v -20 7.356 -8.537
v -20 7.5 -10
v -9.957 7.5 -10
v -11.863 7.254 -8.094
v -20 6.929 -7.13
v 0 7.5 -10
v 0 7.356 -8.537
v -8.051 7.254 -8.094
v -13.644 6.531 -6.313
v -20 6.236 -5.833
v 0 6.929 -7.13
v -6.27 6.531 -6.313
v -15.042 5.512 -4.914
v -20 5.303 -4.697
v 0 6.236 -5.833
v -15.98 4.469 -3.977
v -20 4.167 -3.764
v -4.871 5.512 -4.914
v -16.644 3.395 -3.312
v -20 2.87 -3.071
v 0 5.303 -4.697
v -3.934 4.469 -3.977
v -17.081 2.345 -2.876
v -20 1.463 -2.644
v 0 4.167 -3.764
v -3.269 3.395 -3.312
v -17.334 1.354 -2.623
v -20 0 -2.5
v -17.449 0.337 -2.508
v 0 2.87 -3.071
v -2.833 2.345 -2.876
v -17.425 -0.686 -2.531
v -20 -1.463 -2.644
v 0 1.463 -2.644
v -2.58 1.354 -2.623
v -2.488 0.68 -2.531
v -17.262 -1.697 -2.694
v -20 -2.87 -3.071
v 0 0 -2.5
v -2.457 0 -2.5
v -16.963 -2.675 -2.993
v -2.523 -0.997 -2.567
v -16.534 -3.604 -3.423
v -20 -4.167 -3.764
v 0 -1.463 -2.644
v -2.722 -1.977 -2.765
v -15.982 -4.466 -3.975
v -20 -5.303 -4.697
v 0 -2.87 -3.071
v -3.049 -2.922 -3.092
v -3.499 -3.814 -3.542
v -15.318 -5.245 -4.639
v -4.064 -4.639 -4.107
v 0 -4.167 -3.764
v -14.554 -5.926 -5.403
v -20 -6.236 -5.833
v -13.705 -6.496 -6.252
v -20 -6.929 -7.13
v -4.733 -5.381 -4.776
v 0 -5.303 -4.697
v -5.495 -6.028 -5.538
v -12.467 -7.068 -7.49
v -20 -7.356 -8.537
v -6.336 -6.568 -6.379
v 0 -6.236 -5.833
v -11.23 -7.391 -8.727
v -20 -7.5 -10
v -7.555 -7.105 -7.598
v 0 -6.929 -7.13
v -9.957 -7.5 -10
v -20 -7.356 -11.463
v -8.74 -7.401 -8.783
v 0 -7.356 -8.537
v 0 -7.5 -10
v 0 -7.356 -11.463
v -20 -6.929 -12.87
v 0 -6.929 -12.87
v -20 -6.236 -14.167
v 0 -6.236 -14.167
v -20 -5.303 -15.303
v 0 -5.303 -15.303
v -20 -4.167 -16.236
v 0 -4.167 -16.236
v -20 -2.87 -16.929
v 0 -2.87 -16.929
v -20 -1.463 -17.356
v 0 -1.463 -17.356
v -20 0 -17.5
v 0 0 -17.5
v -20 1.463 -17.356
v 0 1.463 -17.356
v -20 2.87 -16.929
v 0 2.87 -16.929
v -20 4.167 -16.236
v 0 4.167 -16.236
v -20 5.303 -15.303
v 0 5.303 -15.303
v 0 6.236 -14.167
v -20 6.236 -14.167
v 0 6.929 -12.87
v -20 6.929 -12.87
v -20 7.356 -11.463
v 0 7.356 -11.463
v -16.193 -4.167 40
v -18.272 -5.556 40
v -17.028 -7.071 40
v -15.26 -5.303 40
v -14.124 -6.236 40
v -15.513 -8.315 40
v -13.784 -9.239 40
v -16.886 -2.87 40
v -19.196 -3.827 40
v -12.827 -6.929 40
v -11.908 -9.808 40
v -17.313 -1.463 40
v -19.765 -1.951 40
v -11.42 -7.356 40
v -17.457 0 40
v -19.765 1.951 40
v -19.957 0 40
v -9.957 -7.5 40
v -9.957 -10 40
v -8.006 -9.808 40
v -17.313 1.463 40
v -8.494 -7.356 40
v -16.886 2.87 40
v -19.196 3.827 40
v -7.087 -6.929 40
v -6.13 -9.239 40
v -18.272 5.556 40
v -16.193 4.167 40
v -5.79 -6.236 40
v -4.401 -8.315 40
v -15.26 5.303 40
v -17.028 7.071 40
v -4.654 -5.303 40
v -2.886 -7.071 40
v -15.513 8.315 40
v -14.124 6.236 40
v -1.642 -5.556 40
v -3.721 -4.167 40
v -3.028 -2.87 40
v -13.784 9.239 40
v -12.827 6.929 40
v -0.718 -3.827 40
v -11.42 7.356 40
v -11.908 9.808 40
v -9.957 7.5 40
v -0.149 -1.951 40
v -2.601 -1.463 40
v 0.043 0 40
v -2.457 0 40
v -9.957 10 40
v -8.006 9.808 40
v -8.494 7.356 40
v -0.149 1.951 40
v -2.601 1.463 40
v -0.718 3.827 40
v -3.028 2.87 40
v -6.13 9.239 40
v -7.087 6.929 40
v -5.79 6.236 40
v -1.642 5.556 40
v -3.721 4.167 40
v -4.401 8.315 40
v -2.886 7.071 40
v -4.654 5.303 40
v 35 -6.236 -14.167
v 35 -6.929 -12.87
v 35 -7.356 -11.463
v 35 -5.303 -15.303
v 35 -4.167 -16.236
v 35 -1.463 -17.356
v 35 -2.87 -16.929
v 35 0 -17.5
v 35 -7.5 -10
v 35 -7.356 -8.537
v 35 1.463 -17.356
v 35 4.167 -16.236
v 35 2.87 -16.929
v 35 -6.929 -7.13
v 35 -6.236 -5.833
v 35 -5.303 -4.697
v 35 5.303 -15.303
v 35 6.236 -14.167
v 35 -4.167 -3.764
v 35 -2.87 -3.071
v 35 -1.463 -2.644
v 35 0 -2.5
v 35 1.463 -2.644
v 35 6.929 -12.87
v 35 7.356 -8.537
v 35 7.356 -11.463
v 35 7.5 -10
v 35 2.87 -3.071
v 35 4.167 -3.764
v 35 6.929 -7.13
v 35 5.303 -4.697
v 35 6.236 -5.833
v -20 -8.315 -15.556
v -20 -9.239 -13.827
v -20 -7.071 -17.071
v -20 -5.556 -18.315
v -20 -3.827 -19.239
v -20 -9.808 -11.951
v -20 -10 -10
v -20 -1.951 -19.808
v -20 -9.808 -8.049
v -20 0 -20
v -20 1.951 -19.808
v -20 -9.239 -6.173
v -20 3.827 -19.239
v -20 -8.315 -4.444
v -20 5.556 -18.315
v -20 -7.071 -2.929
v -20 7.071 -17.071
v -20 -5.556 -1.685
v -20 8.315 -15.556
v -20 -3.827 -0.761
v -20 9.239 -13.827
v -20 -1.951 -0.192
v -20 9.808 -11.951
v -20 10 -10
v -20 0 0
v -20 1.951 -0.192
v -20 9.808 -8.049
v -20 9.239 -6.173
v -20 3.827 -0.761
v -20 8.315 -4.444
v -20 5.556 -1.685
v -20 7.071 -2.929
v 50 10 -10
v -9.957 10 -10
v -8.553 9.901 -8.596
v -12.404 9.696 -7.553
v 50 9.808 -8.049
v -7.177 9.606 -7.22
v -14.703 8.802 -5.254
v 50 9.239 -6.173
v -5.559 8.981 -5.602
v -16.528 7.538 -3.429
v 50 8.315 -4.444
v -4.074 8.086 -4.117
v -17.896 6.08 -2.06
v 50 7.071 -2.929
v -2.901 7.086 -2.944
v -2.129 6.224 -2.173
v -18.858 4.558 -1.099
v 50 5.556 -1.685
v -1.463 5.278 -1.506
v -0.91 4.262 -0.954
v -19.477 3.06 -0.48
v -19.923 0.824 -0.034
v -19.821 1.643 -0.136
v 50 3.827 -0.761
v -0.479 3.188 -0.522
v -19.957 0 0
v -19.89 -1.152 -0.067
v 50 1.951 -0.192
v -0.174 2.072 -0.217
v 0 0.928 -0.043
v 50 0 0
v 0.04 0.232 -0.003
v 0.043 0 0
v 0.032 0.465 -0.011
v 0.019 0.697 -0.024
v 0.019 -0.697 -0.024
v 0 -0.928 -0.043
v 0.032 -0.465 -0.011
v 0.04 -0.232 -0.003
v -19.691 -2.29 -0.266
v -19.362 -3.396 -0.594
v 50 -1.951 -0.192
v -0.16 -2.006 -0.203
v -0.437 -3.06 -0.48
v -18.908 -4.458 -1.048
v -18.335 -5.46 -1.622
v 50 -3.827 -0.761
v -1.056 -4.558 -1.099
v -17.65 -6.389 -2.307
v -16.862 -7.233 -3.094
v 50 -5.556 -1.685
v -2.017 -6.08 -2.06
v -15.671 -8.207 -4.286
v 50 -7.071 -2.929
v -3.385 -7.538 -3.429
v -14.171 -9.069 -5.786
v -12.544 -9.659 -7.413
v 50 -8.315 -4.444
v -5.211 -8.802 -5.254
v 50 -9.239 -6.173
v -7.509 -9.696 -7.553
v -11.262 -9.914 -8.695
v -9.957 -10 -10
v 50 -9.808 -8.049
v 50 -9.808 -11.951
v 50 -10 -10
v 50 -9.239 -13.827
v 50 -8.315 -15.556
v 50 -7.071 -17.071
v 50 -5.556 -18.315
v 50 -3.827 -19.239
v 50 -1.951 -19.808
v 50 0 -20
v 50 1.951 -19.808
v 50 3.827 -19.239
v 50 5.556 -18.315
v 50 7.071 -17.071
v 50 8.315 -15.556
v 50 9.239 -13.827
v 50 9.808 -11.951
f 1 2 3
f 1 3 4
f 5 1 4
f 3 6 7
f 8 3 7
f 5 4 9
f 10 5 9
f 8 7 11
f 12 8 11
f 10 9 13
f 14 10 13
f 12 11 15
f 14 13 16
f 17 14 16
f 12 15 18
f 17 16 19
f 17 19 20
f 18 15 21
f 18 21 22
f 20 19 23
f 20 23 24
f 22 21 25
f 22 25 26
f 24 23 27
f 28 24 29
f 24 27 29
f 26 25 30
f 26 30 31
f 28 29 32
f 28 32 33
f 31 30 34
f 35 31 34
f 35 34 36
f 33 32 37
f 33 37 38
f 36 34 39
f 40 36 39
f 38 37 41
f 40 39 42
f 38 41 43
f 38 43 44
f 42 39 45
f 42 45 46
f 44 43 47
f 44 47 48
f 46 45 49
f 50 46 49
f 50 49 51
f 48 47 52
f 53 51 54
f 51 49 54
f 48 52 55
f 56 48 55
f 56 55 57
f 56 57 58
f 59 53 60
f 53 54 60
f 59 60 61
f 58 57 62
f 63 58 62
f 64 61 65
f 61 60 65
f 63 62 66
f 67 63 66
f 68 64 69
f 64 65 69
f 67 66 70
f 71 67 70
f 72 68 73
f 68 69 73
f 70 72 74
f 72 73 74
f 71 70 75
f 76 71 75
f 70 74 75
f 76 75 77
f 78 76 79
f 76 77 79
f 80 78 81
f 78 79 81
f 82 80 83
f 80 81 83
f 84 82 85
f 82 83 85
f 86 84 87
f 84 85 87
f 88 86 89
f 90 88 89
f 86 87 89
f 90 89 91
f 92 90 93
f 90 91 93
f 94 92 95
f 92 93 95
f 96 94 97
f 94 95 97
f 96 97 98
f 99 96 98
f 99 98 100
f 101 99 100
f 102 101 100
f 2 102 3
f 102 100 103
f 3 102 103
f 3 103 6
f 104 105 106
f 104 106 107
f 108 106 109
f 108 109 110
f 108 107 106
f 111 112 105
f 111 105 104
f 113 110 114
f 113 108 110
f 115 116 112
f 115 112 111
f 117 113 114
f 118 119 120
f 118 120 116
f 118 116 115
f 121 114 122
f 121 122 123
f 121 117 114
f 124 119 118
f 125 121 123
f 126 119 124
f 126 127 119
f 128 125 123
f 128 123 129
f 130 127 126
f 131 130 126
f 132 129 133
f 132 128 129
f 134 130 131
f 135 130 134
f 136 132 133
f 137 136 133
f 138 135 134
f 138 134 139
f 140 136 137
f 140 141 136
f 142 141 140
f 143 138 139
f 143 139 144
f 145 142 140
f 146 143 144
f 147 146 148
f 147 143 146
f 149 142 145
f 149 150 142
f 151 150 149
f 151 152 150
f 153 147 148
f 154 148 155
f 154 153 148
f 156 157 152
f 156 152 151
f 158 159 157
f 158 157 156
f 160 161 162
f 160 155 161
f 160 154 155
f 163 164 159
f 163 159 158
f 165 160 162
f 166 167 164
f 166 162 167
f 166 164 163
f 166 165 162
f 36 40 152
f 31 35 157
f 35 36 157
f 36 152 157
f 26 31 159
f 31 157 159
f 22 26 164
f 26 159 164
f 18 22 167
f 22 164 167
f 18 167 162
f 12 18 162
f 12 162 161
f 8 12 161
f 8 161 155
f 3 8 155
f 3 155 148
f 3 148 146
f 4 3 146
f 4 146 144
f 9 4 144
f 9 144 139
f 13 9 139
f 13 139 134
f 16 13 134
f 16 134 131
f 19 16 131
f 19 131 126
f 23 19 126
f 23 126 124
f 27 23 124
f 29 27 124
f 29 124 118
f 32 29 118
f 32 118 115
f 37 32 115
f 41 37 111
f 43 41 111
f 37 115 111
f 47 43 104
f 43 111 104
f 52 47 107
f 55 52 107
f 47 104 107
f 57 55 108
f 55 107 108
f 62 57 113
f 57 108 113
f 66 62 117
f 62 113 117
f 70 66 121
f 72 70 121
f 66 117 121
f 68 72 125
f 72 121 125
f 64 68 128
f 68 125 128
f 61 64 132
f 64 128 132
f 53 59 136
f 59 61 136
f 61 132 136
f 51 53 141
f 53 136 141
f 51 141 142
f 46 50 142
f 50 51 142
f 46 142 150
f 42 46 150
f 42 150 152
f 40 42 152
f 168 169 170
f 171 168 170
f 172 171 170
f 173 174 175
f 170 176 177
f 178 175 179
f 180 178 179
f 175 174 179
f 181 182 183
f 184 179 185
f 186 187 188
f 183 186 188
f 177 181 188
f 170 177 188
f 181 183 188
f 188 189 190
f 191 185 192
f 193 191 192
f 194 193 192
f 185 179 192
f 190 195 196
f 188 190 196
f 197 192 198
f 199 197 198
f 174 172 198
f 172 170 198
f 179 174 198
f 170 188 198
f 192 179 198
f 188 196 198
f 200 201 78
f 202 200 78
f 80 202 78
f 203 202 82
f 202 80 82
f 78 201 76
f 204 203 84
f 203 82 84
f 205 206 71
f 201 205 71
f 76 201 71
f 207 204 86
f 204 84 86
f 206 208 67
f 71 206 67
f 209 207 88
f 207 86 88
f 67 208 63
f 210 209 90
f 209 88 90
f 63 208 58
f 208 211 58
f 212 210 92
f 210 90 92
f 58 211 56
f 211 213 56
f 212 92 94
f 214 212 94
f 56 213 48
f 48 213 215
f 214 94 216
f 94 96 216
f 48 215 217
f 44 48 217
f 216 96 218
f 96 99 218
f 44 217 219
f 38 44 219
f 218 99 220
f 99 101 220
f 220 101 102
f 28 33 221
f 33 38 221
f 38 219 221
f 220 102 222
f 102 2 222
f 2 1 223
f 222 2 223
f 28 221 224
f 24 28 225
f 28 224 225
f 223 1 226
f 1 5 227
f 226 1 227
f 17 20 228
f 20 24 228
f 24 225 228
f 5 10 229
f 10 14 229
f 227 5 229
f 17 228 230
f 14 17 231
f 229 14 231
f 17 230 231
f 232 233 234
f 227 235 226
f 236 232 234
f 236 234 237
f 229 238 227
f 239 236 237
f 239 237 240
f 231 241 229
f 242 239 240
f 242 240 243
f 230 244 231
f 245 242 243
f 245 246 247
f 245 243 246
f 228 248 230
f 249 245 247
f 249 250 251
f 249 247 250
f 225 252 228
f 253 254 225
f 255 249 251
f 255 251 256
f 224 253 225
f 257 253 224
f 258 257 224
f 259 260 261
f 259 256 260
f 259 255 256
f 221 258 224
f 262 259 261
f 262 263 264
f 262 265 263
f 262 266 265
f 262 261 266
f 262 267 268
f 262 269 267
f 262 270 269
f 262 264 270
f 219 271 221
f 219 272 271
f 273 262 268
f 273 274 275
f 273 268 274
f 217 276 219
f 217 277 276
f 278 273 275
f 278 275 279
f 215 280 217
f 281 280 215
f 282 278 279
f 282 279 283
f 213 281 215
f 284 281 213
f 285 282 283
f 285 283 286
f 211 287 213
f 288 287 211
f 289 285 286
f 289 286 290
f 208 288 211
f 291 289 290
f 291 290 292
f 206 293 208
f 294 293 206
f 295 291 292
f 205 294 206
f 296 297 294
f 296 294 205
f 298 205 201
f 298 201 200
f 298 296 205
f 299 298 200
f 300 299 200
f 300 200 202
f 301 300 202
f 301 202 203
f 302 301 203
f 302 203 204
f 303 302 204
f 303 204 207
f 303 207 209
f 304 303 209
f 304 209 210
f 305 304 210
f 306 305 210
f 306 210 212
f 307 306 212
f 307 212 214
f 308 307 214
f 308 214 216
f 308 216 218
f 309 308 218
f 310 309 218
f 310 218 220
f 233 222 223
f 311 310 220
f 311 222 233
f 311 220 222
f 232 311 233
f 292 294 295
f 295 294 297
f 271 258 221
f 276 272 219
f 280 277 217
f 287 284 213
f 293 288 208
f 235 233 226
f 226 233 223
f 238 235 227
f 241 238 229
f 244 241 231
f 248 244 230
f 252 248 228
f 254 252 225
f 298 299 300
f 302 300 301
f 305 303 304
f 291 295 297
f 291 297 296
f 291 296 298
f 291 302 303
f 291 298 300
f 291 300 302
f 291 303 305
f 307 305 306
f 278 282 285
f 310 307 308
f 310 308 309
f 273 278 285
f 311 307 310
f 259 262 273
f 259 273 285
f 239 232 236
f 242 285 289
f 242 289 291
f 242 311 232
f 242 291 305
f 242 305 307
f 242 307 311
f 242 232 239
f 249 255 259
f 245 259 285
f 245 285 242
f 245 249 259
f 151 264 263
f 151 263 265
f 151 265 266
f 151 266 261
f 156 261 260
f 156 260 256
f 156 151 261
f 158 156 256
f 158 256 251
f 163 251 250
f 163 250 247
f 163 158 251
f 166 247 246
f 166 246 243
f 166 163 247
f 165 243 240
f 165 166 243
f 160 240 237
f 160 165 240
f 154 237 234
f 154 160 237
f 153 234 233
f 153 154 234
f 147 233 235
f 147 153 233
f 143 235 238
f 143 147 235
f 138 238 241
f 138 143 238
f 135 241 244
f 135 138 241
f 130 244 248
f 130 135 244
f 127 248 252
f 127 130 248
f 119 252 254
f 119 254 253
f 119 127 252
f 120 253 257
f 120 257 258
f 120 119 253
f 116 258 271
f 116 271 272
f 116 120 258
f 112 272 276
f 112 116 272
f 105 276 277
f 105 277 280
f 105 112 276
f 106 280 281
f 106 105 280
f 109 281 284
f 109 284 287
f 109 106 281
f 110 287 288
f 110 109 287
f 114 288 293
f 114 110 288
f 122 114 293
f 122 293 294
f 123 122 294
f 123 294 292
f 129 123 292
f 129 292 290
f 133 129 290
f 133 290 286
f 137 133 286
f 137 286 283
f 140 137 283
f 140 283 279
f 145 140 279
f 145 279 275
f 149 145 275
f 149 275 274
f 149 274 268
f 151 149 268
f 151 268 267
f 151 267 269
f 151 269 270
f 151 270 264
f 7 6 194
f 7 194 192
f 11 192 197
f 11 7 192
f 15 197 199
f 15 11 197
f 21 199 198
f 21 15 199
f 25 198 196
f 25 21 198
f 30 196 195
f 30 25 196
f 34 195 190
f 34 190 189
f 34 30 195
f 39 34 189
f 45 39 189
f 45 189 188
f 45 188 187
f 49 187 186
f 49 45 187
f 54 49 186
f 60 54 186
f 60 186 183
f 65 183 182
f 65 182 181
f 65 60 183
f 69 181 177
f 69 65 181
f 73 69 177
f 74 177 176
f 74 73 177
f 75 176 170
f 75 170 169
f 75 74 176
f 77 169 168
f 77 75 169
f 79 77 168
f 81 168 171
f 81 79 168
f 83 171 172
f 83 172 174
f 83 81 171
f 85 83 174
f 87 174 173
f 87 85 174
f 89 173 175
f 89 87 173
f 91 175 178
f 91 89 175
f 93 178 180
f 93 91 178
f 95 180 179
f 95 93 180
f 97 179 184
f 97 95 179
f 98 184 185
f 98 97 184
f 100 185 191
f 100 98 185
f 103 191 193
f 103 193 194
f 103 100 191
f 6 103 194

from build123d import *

# Parameters (mm, degrees)
F0_R          = 10
F1_DEPTH      = 40
F1_DEPTH_BACK = 10
F2_R          = 10
F3_DEPTH      = 50
F3_DEPTH_BACK = 20
F4_R          = 7.5
F5_DEPTH      = 35
F5_DEPTH_BACK = 25
F6_R          = 7.5
F7_DEPTH      = 50


with BuildPart() as f1:
    # F0 (on Top) → F1 (new body, two sides)
    with BuildSketch(Plane.XY) as f1_sk:
        with Locations((-9.956808, 0)):
            Circle(F0_R)
    extrude(amount=F1_DEPTH)
    extrude(f1_sk.sketch, amount=-F1_DEPTH_BACK)

    # F2 (on Right) → F3 (join, two sides)
    with BuildSketch(Plane.YZ) as f3_sk:
        with Locations((0, -10)):
            Circle(F2_R)
    extrude(amount=F3_DEPTH)
    extrude(f3_sk.sketch, amount=-F3_DEPTH_BACK)

    # F4 (on Right) → F5 (cut, two sides)
    with BuildSketch(Plane.YZ) as f5_sk:
        with Locations((0, -10)):
            Circle(F4_R)
    extrude(amount=F5_DEPTH, mode=Mode.SUBTRACT)
    extrude(f5_sk.sketch, amount=-F5_DEPTH_BACK, mode=Mode.SUBTRACT)

    # F6 (on face) → F7 (cut)
    with BuildSketch(Plane.XY.offset(40)):
        with Locations((-9.956808, 0)):
            Circle(F6_R)
    extrude(amount=-F7_DEPTH, mode=Mode.SUBTRACT)


solid = f1.part
